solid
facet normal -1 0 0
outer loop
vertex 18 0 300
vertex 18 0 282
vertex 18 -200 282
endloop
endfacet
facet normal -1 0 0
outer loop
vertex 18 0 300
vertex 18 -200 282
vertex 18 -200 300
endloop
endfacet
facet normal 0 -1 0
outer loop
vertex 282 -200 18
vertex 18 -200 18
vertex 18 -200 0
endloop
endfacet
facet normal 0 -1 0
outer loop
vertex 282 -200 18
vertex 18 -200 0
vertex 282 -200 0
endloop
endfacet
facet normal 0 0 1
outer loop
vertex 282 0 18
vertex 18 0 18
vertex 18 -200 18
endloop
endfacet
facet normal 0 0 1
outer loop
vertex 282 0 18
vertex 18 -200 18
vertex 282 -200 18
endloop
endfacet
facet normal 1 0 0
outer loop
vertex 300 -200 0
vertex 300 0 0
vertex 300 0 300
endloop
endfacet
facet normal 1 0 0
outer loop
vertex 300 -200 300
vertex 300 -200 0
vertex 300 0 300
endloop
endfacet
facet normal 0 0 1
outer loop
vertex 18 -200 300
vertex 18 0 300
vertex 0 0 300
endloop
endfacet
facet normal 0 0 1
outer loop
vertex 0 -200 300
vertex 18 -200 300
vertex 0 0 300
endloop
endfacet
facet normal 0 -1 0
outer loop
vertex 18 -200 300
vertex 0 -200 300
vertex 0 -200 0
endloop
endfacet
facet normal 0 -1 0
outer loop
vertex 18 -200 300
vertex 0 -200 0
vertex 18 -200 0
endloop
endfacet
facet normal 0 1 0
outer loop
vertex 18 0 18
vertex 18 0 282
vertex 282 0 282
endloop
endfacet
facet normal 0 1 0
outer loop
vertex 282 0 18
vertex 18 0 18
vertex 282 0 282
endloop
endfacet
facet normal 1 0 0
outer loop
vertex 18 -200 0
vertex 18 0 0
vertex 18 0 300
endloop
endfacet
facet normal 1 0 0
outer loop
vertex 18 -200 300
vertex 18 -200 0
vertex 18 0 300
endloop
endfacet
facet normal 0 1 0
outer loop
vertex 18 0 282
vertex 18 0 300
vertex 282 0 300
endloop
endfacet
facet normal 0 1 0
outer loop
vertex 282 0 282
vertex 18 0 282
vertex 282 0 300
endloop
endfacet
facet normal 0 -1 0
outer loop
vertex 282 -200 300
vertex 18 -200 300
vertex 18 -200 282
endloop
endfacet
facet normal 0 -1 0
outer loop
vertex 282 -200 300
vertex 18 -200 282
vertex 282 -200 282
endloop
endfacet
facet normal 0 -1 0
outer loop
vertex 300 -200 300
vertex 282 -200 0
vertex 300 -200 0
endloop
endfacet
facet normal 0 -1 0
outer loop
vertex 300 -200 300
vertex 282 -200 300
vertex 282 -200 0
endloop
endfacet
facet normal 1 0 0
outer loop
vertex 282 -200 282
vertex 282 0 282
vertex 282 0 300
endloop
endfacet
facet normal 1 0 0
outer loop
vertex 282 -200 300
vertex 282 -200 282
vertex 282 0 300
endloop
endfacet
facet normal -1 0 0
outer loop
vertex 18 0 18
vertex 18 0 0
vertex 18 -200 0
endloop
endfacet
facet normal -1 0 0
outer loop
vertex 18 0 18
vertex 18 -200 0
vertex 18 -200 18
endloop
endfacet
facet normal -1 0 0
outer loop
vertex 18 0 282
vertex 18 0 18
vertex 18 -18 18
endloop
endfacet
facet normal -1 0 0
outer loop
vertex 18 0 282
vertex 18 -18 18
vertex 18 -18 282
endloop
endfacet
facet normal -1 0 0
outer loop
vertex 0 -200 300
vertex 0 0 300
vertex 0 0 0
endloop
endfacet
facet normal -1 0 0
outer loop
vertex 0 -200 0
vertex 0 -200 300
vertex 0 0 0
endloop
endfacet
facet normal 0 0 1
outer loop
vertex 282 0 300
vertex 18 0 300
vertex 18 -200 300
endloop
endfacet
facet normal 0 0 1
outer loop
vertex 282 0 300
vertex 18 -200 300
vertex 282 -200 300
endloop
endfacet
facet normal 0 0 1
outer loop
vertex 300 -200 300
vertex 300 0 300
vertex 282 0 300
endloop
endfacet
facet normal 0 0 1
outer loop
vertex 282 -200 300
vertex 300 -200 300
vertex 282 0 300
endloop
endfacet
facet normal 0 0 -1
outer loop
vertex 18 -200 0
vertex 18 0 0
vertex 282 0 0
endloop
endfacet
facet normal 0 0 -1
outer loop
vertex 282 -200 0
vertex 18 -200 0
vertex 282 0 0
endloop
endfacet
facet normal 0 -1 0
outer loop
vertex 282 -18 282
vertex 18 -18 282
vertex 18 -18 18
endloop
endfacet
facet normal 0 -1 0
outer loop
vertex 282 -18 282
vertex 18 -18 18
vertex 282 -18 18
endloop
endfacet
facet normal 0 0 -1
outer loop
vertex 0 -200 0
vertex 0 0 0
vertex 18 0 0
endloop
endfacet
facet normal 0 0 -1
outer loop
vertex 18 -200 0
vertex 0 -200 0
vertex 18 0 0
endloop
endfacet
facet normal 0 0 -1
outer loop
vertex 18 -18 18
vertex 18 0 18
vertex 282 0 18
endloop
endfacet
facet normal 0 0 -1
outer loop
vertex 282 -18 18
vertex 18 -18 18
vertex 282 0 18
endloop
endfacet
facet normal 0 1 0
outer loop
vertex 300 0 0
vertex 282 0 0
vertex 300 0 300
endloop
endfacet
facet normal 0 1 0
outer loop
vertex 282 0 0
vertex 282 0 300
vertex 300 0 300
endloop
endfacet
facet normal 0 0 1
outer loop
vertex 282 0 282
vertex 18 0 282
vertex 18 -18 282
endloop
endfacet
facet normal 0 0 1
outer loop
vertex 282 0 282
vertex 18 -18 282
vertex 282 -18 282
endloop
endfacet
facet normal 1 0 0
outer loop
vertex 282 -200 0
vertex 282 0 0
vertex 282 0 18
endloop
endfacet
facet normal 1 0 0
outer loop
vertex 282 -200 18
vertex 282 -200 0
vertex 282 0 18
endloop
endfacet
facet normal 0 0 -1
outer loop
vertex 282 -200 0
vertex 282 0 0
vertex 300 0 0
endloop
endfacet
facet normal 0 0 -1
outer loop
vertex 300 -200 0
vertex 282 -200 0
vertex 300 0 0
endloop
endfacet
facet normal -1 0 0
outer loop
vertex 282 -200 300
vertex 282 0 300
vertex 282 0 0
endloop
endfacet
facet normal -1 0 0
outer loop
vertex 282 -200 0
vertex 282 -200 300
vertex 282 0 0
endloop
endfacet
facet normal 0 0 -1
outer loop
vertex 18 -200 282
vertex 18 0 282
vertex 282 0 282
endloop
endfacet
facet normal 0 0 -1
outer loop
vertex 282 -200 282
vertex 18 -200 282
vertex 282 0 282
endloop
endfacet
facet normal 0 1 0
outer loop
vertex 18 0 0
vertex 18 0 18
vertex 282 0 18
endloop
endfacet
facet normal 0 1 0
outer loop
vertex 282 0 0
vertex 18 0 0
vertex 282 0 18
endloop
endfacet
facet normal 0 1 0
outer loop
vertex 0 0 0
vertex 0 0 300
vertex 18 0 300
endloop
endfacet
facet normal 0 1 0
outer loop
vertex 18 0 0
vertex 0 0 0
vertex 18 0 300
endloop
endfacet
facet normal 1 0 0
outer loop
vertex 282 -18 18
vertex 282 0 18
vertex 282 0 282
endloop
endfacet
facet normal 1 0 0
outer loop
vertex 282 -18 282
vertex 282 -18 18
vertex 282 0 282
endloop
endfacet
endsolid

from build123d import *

# Parameters (mm, degrees)
F1_W     = 264
F1_H     = 18
F2_DEPTH = 200
F3_DEPTH = 200
F1_H_2   = 264
F4_DEPTH = 18


with BuildPart() as f2:
    # F1 (on Front) → F2 (new body)
    with BuildSketch(Plane.XZ):
        with Locations((150, 291)):
            Rectangle(F1_W, F1_H)
    extrude(amount=F2_DEPTH)


with BuildPart() as f2b:
    # F1 (on Front) → F2, piece 2 (new body)
    with BuildSketch(Plane.XZ):
        with Locations((150, 9)):
            Rectangle(F1_W, F1_H)
    extrude(amount=F2_DEPTH)


with BuildPart() as f3:
    # F1 (on Front) → F3 (new body)
    with BuildSketch(Plane.XZ):
        Polygon((0, 300), (0, 0), (18, 0), (18, 18), (18, 282), (18, 300), align=None)
    extrude(amount=F3_DEPTH)


with BuildPart() as f3b:
    # F1 (on Front) → F3, piece 2 (new body)
    with BuildSketch(Plane.XZ):
        Polygon((282, 18), (282, 0), (300, 0), (300, 300), (282, 300), (282, 282), align=None)
    extrude(amount=F3_DEPTH)


with BuildPart() as f4:
    # F1 (on Front) → F4 (new body)
    with BuildSketch(Plane.XZ):
        with Locations((150, 150)):
            Rectangle(F1_W, F1_H_2)
    extrude(amount=F4_DEPTH)


solid = Compound([f2.part, f2b.part, f3.part, f3b.part, f4.part])
